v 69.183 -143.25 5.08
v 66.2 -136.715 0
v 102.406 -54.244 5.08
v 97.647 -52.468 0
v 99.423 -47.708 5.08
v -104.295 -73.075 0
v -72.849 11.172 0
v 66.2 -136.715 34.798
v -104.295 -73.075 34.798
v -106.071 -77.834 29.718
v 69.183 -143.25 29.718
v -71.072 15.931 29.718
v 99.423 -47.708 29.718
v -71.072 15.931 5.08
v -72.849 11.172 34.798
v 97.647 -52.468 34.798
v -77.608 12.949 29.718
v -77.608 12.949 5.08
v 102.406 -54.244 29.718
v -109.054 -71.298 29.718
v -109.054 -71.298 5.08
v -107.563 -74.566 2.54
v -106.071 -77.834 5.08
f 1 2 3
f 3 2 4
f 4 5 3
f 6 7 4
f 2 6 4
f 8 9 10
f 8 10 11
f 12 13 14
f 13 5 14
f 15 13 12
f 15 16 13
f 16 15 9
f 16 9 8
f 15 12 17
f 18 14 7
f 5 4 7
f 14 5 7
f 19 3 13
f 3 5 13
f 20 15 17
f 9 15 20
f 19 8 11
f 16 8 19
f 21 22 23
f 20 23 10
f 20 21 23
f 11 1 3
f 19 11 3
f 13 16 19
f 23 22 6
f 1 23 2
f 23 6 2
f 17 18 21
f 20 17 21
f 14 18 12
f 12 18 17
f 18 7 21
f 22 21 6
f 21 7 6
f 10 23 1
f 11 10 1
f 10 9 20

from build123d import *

# Parameters (mm, degrees)
F1_DEPTH = 34.798
F2_SIZE  = 5.08
F3_SIZE  = 5.08


with BuildPart() as f1:
    # F0 (on Top) → F1 (new body)
    with BuildSketch(Plane.XY):
        Polygon((-110.830761, -76.057732), (69.183203, -143.250428), (104.182492, -49.48487), (-75.831473, 17.707827), align=None)
    extrude(amount=F1_DEPTH)

    # F2
    f2_edges = [f1.edges().sort_by_distance(p)[0] for p in [
        (14.17551, -15.888522, 34.798),
        (-75.831473, 17.707827, 17.399),
        (-93.331117, -29.174953, 34.798),
        (86.682848, -96.367649, 34.798),
        (-20.823779, -109.65408, 34.798),
        (104.182492, -49.48487, 17.399),
        (14.17551, -15.888522, 0),
        (-93.331117, -29.174953, 0),
        (-110.830761, -76.057732, 17.399),
        (86.682848, -96.367649, 0),
    ]]
    chamfer(f2_edges, length=F2_SIZE)

    # F3
    f3_edges = [f1.edges().sort_by_distance(p)[0] for p in [
        (-20.823779, -109.65408, 0),
    ]]
    chamfer(f3_edges, length=F3_SIZE)


solid = f1.part
